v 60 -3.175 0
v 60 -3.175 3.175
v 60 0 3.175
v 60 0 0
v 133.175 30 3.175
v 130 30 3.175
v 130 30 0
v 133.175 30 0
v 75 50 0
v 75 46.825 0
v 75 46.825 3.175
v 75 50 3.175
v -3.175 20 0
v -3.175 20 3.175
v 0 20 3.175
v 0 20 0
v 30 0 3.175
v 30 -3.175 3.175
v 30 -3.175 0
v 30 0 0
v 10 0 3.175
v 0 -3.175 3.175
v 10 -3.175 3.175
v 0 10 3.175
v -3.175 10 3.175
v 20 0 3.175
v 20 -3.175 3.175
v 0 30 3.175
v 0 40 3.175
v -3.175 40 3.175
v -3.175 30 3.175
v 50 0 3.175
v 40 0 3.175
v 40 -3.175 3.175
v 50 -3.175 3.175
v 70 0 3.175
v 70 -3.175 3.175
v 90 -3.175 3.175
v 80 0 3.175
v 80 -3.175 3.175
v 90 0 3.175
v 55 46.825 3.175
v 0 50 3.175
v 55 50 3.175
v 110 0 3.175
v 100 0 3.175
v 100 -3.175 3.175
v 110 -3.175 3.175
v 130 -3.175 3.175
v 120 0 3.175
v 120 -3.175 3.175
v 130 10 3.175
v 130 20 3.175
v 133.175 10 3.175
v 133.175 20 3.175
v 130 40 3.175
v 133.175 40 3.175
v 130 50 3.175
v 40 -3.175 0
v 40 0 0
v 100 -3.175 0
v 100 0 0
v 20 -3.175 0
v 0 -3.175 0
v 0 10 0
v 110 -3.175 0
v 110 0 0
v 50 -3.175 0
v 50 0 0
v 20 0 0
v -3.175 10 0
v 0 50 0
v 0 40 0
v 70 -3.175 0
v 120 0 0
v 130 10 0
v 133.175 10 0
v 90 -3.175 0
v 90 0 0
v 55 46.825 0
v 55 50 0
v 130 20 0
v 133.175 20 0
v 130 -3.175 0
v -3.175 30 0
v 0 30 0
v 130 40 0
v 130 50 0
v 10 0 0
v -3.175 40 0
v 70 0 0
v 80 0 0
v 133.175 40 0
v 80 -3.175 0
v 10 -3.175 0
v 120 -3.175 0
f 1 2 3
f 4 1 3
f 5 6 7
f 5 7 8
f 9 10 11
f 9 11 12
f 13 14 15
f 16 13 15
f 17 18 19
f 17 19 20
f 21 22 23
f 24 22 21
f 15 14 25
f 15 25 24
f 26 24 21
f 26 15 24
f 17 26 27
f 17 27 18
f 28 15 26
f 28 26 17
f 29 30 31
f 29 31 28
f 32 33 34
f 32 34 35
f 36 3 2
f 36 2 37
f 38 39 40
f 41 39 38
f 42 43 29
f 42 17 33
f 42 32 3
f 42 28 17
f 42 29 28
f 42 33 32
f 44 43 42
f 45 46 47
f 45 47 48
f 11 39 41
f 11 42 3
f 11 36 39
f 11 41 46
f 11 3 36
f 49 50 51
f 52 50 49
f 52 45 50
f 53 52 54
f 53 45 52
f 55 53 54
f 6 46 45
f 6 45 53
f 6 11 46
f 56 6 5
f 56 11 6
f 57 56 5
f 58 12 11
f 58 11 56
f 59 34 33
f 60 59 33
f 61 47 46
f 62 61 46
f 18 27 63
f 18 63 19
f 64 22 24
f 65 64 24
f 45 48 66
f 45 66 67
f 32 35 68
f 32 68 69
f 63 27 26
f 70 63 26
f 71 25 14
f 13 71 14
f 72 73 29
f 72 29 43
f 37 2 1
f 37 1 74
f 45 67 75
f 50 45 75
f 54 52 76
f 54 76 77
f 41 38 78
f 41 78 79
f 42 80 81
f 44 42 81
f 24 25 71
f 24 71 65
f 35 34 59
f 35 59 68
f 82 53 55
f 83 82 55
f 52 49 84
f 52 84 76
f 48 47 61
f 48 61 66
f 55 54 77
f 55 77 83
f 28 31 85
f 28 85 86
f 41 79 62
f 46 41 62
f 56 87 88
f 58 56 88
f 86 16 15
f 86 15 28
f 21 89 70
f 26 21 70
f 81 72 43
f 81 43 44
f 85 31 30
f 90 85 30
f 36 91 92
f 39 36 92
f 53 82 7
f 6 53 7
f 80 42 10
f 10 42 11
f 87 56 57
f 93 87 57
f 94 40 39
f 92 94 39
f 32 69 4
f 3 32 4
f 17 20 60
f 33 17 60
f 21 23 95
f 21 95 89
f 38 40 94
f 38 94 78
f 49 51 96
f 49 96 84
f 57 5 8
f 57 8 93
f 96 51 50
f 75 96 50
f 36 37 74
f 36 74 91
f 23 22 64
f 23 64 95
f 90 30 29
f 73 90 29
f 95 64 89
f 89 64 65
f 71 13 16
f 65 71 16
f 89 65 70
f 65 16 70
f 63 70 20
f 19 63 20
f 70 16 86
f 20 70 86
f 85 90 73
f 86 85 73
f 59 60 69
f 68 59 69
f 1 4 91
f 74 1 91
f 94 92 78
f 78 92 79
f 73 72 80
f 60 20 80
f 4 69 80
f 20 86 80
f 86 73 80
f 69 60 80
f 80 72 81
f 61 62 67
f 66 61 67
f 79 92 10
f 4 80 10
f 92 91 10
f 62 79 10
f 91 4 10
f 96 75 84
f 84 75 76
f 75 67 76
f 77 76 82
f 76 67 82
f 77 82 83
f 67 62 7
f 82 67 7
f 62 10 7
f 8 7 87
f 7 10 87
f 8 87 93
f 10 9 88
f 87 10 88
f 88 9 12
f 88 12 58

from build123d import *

# Parameters (mm, degrees)
ESQUISSE1_W                = 130
ESQUISSE1_H                = 50
BOSS_EXTRU_1_DEPTH         = 3.175
ESQUISSE2_W                = 3.175
ESQUISSE2_H                = 10
BOSS_EXTRU_2_DEPTH         = 3.175
ESQUISSE3_W                = 20
ESQUISSE3_H                = 3.175
ENL_V_MAT_EXTRU_1_DEPTH    = 3.175
ESQUISSE4_W                = 10
ESQUISSE4_H                = 3.175
BOSS_EXTRU_3_DEPTH         = 3.175
R_P_TITION_LIN_AIRE1_COUNT = 7
R_P_TITION_LIN_AIRE1_PITCH = 20


with BuildPart() as part:
    # Esquisse1 → Boss.-Extru.1 (new body)
    with BuildSketch(Plane.XY):
        with Locations((65, 25)):
            Rectangle(ESQUISSE1_W, ESQUISSE1_H)
    extrude(amount=BOSS_EXTRU_1_DEPTH)

    # Esquisse2 → Boss.-Extru.2 (add)
    with BuildSketch(Plane.XY.offset(3.175)):
        with Locations((131.5875, 35)):
            Rectangle(ESQUISSE2_W, ESQUISSE2_H)
        with Locations((131.5875, 15)):
            Rectangle(ESQUISSE2_W, ESQUISSE2_H)
        with Locations((-1.5875, 35)):
            Rectangle(ESQUISSE2_W, ESQUISSE2_H)
        with Locations((-1.5875, 15)):
            Rectangle(ESQUISSE2_W, ESQUISSE2_H)
    extrude(amount=-BOSS_EXTRU_2_DEPTH)

    # Esquisse3 → Enlèv. mat.-Extru.1 (cut)
    with BuildSketch(Plane.XY.offset(3.175)):
        with Locations((65, 48.4125)):
            Rectangle(ESQUISSE3_W, ESQUISSE3_H)
    extrude(amount=-ENL_V_MAT_EXTRU_1_DEPTH, mode=Mode.SUBTRACT)

    # Esquisse4 → Boss.-Extru.3 (add)
    with BuildSketch(Plane.XY.offset(3.175)):
        with Locations((5, -1.5875)):
            Rectangle(ESQUISSE4_W, ESQUISSE4_H)
    boss_extru_3 = extrude(amount=-BOSS_EXTRU_3_DEPTH)

    # Répétition linéaire1: Boss.-Extru.3 ×7
    with Locations(*[(i * R_P_TITION_LIN_AIRE1_PITCH, 0, 0) for i in range(1, R_P_TITION_LIN_AIRE1_COUNT)]):
        add(boss_extru_3)


solid = part.part
